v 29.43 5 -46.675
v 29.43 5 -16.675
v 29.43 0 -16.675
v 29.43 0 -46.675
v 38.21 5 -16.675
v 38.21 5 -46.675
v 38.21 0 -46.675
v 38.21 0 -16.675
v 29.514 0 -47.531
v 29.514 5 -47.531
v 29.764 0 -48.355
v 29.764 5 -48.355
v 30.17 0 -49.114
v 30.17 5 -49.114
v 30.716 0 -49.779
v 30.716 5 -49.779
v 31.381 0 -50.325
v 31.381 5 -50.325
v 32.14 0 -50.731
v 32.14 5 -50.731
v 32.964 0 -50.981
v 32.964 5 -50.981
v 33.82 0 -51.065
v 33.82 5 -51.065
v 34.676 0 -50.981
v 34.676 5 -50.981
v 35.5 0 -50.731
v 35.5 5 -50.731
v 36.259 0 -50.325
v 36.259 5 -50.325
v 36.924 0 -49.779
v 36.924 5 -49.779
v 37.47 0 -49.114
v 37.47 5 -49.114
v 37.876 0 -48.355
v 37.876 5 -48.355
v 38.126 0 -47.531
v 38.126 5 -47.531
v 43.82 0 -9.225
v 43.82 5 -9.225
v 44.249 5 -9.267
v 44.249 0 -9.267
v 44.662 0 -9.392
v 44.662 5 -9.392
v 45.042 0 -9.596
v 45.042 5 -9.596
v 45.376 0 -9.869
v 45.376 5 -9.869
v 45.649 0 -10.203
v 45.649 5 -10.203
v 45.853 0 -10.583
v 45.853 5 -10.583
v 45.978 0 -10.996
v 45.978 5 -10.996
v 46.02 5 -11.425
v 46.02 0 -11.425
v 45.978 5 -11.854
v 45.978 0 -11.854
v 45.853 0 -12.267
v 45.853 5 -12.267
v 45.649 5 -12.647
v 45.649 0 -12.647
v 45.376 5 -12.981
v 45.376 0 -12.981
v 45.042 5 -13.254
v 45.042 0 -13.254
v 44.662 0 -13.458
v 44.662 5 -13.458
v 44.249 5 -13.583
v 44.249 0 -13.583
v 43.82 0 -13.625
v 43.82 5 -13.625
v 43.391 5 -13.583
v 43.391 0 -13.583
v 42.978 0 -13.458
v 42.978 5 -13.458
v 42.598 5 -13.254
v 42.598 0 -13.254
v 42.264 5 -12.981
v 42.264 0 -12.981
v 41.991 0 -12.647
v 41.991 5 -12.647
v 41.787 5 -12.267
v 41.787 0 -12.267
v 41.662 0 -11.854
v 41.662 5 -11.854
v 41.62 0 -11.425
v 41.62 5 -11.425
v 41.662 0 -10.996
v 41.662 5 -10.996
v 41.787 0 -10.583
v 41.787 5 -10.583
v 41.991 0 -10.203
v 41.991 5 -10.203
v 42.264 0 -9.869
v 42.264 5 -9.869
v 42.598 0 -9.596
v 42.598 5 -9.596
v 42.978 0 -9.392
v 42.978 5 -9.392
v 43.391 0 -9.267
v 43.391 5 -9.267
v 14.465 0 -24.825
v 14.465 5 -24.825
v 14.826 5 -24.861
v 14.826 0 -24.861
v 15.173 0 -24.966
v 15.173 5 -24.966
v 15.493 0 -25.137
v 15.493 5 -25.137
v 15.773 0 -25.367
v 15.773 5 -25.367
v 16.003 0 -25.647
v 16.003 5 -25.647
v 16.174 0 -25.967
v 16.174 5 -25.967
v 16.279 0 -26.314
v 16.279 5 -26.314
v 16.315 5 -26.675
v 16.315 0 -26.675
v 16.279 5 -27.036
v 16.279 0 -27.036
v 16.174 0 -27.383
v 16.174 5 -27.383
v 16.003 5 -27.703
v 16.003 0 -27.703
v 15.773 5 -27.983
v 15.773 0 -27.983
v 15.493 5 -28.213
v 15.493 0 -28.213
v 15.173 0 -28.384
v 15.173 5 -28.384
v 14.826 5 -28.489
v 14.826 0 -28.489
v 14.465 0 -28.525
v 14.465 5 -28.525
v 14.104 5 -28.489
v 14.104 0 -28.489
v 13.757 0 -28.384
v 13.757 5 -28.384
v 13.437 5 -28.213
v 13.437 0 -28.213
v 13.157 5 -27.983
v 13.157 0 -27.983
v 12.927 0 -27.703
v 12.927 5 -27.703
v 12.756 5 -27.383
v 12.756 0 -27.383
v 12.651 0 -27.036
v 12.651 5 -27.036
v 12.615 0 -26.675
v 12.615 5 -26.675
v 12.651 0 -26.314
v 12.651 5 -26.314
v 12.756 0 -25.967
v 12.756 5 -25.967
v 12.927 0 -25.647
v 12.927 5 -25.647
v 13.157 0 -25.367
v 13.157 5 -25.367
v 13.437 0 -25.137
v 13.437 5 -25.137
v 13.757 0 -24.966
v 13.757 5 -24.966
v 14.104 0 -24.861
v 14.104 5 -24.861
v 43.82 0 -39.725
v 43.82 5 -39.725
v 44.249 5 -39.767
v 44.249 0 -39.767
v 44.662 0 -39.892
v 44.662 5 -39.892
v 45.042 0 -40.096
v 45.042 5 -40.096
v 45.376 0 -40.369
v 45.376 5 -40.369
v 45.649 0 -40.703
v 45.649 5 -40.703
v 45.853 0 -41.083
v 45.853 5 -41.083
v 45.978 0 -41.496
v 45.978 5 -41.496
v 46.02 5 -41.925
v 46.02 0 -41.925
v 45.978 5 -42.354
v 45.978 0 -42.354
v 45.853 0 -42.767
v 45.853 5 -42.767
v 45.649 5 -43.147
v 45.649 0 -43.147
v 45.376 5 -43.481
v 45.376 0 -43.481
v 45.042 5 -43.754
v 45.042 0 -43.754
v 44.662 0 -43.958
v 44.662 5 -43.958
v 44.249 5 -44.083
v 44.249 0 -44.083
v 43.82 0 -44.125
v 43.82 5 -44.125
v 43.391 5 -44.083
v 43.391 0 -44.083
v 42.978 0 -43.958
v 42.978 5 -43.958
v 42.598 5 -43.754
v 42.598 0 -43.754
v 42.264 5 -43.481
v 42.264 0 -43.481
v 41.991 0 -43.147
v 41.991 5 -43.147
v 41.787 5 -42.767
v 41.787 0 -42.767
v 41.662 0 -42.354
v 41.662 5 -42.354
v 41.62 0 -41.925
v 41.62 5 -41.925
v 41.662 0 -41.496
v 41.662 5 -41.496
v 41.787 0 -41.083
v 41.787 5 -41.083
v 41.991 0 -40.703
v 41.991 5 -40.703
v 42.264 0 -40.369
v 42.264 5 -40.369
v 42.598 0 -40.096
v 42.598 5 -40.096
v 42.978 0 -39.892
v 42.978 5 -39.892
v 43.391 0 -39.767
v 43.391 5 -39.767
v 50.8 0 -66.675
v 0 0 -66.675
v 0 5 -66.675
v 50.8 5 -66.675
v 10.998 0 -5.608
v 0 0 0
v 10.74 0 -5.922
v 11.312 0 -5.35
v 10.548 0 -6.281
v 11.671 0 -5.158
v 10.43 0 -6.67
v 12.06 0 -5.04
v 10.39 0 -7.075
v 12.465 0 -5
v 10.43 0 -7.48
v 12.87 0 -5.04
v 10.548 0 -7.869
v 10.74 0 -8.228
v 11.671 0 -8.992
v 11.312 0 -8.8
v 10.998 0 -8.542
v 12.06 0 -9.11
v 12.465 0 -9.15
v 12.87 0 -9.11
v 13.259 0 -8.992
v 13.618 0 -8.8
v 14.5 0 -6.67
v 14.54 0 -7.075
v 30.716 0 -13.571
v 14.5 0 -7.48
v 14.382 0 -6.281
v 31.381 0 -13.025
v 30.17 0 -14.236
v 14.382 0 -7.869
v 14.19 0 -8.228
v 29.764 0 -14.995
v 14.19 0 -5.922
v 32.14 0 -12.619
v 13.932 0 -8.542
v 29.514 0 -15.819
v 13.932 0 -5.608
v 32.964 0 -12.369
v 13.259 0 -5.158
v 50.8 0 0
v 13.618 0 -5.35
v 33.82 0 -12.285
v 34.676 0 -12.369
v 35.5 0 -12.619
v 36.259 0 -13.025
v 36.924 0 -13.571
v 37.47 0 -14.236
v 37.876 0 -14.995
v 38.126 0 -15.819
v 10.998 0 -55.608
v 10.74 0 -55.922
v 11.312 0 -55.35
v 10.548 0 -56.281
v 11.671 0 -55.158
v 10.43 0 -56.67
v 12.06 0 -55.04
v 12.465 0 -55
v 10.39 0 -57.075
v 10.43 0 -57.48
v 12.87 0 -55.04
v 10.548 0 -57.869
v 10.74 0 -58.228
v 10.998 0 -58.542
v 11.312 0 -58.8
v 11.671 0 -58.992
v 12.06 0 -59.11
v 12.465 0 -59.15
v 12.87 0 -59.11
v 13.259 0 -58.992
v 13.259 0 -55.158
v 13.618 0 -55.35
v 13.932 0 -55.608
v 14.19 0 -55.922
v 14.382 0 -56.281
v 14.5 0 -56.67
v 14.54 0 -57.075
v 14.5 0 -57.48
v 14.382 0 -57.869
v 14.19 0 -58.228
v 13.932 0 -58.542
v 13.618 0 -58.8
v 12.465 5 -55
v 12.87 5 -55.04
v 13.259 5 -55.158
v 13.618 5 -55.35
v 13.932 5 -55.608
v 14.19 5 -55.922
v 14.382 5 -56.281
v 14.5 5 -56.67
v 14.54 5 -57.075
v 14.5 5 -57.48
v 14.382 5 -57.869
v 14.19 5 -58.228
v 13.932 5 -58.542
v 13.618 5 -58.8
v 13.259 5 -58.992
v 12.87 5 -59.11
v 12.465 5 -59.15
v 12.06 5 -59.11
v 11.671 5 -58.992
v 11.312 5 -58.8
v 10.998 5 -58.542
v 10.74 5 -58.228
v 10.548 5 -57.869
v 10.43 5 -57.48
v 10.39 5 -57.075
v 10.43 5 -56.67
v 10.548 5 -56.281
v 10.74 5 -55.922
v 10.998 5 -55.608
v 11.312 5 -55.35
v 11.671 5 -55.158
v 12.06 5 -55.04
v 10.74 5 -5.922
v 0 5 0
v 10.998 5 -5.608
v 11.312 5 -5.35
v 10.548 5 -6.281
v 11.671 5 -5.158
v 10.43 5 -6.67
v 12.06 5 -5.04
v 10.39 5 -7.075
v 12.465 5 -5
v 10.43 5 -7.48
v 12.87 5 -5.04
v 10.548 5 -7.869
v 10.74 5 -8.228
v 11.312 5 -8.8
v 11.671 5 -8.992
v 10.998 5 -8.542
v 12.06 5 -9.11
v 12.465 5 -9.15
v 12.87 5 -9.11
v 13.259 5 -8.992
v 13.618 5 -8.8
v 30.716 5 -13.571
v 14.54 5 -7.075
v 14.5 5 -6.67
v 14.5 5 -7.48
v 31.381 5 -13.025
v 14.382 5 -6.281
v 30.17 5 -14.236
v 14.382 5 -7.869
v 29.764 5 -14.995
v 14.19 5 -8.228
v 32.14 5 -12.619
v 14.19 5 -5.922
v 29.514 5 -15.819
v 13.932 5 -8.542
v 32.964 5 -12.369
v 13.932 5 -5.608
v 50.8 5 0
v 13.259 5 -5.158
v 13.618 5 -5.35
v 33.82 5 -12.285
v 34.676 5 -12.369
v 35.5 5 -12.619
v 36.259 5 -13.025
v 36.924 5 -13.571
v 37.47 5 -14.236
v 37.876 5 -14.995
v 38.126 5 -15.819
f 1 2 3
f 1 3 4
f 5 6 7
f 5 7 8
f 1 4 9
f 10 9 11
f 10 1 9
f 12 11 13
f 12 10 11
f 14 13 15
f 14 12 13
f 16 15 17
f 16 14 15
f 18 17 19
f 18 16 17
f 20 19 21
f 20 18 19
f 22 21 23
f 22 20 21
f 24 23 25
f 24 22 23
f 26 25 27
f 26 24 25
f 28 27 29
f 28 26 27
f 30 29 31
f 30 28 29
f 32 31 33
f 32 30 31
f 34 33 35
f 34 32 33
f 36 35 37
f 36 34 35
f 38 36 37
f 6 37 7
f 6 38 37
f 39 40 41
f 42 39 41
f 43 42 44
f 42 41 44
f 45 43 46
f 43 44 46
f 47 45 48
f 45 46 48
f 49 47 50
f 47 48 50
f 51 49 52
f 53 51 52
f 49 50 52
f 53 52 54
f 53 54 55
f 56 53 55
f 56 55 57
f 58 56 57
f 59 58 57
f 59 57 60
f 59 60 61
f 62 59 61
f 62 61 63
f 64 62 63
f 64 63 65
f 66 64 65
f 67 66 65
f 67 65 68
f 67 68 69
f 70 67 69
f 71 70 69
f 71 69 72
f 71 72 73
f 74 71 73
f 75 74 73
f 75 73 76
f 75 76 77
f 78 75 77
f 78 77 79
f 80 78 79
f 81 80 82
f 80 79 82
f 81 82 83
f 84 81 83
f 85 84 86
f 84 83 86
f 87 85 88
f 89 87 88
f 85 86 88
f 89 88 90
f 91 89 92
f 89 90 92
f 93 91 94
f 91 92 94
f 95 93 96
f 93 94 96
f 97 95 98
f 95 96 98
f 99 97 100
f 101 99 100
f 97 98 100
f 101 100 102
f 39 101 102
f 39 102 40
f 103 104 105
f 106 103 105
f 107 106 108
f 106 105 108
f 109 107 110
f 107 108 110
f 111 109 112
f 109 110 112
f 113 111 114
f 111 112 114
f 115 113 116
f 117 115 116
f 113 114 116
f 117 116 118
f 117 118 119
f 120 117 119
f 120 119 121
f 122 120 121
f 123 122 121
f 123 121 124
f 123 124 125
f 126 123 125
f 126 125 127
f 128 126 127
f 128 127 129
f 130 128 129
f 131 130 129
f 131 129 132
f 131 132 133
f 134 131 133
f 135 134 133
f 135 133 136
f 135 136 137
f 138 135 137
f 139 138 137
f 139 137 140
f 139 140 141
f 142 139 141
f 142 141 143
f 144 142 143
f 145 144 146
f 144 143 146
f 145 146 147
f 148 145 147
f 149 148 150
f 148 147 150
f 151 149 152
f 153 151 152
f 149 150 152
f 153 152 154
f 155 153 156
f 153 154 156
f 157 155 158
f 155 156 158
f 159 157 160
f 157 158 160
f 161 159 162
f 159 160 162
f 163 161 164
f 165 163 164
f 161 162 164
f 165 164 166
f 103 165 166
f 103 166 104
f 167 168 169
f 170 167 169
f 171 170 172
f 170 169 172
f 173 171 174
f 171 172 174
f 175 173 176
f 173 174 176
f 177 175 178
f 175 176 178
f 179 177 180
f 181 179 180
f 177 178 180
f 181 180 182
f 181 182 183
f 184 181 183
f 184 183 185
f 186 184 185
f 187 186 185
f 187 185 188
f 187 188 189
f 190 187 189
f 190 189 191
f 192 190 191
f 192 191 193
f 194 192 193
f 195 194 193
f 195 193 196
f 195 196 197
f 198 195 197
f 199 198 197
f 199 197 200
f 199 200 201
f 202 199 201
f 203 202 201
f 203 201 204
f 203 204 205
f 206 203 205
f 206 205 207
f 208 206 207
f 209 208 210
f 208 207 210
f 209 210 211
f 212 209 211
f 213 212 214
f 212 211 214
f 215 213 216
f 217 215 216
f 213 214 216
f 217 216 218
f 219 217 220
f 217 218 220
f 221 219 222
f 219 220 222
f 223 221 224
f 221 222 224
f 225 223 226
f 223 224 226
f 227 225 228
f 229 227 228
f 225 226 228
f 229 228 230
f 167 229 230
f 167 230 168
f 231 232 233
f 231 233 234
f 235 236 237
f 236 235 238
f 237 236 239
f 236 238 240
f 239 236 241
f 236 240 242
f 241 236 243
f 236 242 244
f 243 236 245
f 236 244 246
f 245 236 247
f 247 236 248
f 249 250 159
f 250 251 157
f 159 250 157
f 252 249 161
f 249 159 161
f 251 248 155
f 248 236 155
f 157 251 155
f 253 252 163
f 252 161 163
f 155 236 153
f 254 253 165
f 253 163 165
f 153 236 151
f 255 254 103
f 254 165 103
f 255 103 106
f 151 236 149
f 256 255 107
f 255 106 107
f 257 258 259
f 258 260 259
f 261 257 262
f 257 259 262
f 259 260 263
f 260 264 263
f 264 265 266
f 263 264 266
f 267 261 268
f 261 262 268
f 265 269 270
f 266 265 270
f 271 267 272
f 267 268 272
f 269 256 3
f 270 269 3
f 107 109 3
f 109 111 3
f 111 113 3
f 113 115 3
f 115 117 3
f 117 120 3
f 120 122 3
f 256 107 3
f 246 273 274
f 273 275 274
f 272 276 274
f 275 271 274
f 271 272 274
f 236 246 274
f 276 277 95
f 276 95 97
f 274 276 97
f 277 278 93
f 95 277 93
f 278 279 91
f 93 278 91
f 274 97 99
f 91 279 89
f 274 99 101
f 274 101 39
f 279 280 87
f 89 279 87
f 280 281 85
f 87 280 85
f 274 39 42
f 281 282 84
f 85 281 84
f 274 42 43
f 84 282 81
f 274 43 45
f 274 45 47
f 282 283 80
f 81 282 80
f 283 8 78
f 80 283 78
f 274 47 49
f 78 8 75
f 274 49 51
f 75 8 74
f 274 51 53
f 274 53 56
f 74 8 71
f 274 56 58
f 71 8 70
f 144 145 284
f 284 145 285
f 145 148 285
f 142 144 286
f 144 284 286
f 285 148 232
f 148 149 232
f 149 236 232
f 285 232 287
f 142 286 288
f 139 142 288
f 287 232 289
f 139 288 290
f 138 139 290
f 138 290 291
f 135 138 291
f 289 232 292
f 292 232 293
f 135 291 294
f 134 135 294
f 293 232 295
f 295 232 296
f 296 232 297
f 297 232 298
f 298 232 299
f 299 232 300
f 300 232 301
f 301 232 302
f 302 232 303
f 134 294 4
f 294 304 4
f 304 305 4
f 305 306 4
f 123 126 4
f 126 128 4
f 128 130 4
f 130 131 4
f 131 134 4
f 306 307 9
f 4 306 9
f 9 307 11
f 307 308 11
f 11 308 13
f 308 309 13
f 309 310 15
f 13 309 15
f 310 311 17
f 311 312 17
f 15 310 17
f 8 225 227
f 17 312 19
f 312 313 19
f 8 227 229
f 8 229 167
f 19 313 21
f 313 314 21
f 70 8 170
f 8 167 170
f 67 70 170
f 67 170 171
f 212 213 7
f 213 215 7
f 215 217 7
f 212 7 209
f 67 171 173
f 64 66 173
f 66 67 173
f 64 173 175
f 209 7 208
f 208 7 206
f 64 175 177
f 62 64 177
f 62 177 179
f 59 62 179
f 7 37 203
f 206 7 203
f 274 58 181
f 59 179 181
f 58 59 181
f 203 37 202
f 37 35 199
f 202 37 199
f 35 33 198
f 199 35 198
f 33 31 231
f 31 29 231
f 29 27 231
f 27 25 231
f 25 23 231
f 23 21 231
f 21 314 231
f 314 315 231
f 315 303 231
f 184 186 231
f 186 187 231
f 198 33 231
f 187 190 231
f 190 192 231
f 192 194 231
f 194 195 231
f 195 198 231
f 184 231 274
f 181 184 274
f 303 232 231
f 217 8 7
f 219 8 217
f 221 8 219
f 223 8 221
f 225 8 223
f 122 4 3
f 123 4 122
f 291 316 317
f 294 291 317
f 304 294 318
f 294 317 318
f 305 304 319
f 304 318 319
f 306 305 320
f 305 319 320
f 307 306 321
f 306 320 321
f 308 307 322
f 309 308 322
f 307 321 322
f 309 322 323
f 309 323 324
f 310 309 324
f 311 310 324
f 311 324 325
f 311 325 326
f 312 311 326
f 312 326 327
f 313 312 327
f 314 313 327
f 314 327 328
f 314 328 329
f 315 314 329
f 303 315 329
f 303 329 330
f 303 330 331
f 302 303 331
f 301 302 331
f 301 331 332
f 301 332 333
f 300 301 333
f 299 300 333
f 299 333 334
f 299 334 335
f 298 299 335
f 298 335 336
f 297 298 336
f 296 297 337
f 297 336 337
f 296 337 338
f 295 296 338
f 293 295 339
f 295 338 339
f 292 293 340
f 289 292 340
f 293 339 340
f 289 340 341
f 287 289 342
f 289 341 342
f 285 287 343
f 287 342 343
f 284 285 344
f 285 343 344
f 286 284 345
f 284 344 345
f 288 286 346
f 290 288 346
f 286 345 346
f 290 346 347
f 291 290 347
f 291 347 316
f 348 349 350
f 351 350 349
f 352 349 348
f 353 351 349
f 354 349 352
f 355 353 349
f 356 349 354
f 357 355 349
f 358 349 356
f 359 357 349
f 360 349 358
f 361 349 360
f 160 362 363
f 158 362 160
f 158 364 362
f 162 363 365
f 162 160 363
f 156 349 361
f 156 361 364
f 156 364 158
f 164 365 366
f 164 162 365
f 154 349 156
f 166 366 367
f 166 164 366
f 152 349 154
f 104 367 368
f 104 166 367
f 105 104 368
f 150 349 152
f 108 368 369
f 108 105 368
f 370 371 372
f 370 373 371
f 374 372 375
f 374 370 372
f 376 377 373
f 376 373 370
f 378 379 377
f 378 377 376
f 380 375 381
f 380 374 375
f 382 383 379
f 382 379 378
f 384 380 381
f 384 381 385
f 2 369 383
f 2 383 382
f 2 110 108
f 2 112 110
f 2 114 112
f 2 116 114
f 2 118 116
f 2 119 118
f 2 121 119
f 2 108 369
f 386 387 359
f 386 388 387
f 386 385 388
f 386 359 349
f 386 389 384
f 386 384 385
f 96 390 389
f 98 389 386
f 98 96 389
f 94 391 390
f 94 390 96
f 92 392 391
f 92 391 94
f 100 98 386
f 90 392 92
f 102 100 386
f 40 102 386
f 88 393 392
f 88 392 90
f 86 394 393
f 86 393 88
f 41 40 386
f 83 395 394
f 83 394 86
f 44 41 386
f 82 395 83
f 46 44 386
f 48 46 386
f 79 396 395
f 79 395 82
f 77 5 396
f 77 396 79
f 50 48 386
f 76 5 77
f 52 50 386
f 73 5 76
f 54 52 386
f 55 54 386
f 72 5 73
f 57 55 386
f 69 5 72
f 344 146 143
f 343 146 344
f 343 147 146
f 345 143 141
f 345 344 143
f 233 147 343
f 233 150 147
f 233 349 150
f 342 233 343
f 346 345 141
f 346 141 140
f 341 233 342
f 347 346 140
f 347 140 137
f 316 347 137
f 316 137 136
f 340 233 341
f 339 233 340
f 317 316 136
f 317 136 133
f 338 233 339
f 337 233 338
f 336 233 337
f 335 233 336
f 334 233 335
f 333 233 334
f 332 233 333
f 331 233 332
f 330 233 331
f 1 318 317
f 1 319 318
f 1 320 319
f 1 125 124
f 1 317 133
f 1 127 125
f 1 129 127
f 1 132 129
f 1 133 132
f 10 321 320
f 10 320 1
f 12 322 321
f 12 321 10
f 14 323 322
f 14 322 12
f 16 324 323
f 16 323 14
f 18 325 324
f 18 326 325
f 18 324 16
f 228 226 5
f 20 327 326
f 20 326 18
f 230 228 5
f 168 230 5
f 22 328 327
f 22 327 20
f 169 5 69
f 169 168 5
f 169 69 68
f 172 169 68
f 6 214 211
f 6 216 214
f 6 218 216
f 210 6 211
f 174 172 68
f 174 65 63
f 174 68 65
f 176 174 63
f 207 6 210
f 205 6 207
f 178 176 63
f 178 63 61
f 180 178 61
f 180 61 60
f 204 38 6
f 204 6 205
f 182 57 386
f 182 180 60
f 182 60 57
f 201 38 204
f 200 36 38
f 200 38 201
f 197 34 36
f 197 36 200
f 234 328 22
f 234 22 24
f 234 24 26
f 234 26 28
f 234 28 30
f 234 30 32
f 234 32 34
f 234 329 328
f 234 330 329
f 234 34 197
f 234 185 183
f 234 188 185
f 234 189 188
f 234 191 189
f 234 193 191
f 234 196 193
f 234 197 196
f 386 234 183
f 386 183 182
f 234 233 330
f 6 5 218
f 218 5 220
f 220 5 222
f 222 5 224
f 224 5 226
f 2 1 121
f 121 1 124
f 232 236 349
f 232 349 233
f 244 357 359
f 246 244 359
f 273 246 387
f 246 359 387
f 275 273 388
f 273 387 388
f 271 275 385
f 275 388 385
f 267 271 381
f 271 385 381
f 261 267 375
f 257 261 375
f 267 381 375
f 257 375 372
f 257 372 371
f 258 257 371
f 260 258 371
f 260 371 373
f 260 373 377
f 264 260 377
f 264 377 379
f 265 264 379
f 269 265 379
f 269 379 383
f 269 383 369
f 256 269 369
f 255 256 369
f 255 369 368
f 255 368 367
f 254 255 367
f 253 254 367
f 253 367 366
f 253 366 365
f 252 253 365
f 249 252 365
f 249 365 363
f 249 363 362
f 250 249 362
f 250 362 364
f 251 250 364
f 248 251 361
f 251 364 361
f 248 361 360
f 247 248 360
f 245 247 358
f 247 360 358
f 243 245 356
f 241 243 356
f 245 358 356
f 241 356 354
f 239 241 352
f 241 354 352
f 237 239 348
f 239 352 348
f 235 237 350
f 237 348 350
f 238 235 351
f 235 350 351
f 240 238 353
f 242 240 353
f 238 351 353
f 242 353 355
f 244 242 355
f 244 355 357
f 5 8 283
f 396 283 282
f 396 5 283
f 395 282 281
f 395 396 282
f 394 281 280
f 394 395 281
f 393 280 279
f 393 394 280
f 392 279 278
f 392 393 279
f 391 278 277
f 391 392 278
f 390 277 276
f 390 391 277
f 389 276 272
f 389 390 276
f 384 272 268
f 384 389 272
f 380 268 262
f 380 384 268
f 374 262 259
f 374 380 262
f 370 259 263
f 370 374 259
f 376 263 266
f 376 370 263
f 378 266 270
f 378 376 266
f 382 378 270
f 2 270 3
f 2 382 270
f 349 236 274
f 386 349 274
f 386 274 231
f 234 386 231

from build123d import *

# Parameters (mm, degrees)
SKETCH1_W           = 50.8
SKETCH1_H           = 66.675
BOSS_EXTRUDE1_DEPTH = 5
SKETCH2_R           = 2.075
SKETCH2_R_2         = 1.85
CUT_EXTRUDE1_DEPTH  = 6
CUT_EXTRUDE2_REACH  = 7
SKETCH3_R           = 2.2
CUT_EXTRUDE3_REACH  = 7


with BuildPart() as part:
    # Sketch1 → Boss-Extrude1 (new body)
    with BuildSketch(Plane(origin=(0, 0, 0), x_dir=(1, 0, 0), z_dir=(0, 1, 0))):
        with Locations((25.4, 33.3375)):
            Rectangle(SKETCH1_W, SKETCH1_H)
    extrude(amount=BOSS_EXTRUDE1_DEPTH)

    # Sketch2 → Cut-Extrude1 (cut, through all)
    with BuildSketch(Plane(origin=(0, 5, 0), x_dir=(1, 0, 0), z_dir=(0, 1, 0))):
        with Locations(Location((12.465, 57.075, 0), (0, 0, 270))):  # turned: the seam where the file's is
            Circle(SKETCH2_R)
        with Locations(Location((12.465, 7.075, 0), (0, 0, 270))):  # turned: the seam where the file's is
            Circle(SKETCH2_R)
        with Locations(Location((14.465, 26.675, 0), (0, 0, 270))):  # turned: the seam where the file's is
            Circle(SKETCH2_R_2)
    extrude(amount=-CUT_EXTRUDE1_DEPTH, mode=Mode.SUBTRACT)

    # Sketch3 → Cut-Extrude2 (cut, up to next)
    with BuildSketch(Plane(origin=(0, 5, 0), x_dir=(1, 0, 0), z_dir=(0, 1, 0)), mode=Mode.PRIVATE) as cut_extrude2_sk1:
        with Locations(Location((43.82, 41.925, 0), (0, 0, 270))):  # turned: the seam where the file's is
            Circle(SKETCH3_R)
    cut_extrude2_tool1 = extrude(cut_extrude2_sk1.sketch, amount=-CUT_EXTRUDE2_REACH, mode=Mode.PRIVATE) & part.part
    add(cut_extrude2_tool1.solids().sort_by_distance((43.82, 5, -41.925))[0], mode=Mode.SUBTRACT)
    # Sketch3 → Cut-Extrude2 (cut, up to next)
    with BuildSketch(Plane(origin=(0, 5, 0), x_dir=(1, 0, 0), z_dir=(0, 1, 0)), mode=Mode.PRIVATE) as cut_extrude2_sk2:
        with Locations(Location((43.82, 11.425, 0), (0, 0, 270))):  # turned: the seam where the file's is
            Circle(SKETCH3_R)
    cut_extrude2_tool2 = extrude(cut_extrude2_sk2.sketch, amount=-CUT_EXTRUDE2_REACH, mode=Mode.PRIVATE) & part.part
    add(cut_extrude2_tool2.solids().sort_by_distance((43.82, 5, -11.425))[0], mode=Mode.SUBTRACT)

    # Sketch4 → Cut-Extrude3 (cut, up to next)
    with BuildSketch(Plane(origin=(0, 5, 0), x_dir=(1, 0, 0), z_dir=(0, 1, 0)), mode=Mode.PRIVATE) as cut_extrude3_sk1:
        with BuildLine():
            Line((38.21, 46.675), (38.21, 16.675))
            ThreePointArc((38.21, 16.675), (33.82, 12.285), (29.43, 16.675))
            Line((29.43, 16.675), (29.43, 46.675))
            ThreePointArc((29.43, 46.675), (33.82, 51.065), (38.21, 46.675))
        make_face()
    cut_extrude3_tool1 = extrude(cut_extrude3_sk1.sketch, amount=-CUT_EXTRUDE3_REACH, mode=Mode.PRIVATE) & part.part
    add(cut_extrude3_tool1.solids().sort_by_distance((33.82, 5, -31.675))[0], mode=Mode.SUBTRACT)


solid = part.part
